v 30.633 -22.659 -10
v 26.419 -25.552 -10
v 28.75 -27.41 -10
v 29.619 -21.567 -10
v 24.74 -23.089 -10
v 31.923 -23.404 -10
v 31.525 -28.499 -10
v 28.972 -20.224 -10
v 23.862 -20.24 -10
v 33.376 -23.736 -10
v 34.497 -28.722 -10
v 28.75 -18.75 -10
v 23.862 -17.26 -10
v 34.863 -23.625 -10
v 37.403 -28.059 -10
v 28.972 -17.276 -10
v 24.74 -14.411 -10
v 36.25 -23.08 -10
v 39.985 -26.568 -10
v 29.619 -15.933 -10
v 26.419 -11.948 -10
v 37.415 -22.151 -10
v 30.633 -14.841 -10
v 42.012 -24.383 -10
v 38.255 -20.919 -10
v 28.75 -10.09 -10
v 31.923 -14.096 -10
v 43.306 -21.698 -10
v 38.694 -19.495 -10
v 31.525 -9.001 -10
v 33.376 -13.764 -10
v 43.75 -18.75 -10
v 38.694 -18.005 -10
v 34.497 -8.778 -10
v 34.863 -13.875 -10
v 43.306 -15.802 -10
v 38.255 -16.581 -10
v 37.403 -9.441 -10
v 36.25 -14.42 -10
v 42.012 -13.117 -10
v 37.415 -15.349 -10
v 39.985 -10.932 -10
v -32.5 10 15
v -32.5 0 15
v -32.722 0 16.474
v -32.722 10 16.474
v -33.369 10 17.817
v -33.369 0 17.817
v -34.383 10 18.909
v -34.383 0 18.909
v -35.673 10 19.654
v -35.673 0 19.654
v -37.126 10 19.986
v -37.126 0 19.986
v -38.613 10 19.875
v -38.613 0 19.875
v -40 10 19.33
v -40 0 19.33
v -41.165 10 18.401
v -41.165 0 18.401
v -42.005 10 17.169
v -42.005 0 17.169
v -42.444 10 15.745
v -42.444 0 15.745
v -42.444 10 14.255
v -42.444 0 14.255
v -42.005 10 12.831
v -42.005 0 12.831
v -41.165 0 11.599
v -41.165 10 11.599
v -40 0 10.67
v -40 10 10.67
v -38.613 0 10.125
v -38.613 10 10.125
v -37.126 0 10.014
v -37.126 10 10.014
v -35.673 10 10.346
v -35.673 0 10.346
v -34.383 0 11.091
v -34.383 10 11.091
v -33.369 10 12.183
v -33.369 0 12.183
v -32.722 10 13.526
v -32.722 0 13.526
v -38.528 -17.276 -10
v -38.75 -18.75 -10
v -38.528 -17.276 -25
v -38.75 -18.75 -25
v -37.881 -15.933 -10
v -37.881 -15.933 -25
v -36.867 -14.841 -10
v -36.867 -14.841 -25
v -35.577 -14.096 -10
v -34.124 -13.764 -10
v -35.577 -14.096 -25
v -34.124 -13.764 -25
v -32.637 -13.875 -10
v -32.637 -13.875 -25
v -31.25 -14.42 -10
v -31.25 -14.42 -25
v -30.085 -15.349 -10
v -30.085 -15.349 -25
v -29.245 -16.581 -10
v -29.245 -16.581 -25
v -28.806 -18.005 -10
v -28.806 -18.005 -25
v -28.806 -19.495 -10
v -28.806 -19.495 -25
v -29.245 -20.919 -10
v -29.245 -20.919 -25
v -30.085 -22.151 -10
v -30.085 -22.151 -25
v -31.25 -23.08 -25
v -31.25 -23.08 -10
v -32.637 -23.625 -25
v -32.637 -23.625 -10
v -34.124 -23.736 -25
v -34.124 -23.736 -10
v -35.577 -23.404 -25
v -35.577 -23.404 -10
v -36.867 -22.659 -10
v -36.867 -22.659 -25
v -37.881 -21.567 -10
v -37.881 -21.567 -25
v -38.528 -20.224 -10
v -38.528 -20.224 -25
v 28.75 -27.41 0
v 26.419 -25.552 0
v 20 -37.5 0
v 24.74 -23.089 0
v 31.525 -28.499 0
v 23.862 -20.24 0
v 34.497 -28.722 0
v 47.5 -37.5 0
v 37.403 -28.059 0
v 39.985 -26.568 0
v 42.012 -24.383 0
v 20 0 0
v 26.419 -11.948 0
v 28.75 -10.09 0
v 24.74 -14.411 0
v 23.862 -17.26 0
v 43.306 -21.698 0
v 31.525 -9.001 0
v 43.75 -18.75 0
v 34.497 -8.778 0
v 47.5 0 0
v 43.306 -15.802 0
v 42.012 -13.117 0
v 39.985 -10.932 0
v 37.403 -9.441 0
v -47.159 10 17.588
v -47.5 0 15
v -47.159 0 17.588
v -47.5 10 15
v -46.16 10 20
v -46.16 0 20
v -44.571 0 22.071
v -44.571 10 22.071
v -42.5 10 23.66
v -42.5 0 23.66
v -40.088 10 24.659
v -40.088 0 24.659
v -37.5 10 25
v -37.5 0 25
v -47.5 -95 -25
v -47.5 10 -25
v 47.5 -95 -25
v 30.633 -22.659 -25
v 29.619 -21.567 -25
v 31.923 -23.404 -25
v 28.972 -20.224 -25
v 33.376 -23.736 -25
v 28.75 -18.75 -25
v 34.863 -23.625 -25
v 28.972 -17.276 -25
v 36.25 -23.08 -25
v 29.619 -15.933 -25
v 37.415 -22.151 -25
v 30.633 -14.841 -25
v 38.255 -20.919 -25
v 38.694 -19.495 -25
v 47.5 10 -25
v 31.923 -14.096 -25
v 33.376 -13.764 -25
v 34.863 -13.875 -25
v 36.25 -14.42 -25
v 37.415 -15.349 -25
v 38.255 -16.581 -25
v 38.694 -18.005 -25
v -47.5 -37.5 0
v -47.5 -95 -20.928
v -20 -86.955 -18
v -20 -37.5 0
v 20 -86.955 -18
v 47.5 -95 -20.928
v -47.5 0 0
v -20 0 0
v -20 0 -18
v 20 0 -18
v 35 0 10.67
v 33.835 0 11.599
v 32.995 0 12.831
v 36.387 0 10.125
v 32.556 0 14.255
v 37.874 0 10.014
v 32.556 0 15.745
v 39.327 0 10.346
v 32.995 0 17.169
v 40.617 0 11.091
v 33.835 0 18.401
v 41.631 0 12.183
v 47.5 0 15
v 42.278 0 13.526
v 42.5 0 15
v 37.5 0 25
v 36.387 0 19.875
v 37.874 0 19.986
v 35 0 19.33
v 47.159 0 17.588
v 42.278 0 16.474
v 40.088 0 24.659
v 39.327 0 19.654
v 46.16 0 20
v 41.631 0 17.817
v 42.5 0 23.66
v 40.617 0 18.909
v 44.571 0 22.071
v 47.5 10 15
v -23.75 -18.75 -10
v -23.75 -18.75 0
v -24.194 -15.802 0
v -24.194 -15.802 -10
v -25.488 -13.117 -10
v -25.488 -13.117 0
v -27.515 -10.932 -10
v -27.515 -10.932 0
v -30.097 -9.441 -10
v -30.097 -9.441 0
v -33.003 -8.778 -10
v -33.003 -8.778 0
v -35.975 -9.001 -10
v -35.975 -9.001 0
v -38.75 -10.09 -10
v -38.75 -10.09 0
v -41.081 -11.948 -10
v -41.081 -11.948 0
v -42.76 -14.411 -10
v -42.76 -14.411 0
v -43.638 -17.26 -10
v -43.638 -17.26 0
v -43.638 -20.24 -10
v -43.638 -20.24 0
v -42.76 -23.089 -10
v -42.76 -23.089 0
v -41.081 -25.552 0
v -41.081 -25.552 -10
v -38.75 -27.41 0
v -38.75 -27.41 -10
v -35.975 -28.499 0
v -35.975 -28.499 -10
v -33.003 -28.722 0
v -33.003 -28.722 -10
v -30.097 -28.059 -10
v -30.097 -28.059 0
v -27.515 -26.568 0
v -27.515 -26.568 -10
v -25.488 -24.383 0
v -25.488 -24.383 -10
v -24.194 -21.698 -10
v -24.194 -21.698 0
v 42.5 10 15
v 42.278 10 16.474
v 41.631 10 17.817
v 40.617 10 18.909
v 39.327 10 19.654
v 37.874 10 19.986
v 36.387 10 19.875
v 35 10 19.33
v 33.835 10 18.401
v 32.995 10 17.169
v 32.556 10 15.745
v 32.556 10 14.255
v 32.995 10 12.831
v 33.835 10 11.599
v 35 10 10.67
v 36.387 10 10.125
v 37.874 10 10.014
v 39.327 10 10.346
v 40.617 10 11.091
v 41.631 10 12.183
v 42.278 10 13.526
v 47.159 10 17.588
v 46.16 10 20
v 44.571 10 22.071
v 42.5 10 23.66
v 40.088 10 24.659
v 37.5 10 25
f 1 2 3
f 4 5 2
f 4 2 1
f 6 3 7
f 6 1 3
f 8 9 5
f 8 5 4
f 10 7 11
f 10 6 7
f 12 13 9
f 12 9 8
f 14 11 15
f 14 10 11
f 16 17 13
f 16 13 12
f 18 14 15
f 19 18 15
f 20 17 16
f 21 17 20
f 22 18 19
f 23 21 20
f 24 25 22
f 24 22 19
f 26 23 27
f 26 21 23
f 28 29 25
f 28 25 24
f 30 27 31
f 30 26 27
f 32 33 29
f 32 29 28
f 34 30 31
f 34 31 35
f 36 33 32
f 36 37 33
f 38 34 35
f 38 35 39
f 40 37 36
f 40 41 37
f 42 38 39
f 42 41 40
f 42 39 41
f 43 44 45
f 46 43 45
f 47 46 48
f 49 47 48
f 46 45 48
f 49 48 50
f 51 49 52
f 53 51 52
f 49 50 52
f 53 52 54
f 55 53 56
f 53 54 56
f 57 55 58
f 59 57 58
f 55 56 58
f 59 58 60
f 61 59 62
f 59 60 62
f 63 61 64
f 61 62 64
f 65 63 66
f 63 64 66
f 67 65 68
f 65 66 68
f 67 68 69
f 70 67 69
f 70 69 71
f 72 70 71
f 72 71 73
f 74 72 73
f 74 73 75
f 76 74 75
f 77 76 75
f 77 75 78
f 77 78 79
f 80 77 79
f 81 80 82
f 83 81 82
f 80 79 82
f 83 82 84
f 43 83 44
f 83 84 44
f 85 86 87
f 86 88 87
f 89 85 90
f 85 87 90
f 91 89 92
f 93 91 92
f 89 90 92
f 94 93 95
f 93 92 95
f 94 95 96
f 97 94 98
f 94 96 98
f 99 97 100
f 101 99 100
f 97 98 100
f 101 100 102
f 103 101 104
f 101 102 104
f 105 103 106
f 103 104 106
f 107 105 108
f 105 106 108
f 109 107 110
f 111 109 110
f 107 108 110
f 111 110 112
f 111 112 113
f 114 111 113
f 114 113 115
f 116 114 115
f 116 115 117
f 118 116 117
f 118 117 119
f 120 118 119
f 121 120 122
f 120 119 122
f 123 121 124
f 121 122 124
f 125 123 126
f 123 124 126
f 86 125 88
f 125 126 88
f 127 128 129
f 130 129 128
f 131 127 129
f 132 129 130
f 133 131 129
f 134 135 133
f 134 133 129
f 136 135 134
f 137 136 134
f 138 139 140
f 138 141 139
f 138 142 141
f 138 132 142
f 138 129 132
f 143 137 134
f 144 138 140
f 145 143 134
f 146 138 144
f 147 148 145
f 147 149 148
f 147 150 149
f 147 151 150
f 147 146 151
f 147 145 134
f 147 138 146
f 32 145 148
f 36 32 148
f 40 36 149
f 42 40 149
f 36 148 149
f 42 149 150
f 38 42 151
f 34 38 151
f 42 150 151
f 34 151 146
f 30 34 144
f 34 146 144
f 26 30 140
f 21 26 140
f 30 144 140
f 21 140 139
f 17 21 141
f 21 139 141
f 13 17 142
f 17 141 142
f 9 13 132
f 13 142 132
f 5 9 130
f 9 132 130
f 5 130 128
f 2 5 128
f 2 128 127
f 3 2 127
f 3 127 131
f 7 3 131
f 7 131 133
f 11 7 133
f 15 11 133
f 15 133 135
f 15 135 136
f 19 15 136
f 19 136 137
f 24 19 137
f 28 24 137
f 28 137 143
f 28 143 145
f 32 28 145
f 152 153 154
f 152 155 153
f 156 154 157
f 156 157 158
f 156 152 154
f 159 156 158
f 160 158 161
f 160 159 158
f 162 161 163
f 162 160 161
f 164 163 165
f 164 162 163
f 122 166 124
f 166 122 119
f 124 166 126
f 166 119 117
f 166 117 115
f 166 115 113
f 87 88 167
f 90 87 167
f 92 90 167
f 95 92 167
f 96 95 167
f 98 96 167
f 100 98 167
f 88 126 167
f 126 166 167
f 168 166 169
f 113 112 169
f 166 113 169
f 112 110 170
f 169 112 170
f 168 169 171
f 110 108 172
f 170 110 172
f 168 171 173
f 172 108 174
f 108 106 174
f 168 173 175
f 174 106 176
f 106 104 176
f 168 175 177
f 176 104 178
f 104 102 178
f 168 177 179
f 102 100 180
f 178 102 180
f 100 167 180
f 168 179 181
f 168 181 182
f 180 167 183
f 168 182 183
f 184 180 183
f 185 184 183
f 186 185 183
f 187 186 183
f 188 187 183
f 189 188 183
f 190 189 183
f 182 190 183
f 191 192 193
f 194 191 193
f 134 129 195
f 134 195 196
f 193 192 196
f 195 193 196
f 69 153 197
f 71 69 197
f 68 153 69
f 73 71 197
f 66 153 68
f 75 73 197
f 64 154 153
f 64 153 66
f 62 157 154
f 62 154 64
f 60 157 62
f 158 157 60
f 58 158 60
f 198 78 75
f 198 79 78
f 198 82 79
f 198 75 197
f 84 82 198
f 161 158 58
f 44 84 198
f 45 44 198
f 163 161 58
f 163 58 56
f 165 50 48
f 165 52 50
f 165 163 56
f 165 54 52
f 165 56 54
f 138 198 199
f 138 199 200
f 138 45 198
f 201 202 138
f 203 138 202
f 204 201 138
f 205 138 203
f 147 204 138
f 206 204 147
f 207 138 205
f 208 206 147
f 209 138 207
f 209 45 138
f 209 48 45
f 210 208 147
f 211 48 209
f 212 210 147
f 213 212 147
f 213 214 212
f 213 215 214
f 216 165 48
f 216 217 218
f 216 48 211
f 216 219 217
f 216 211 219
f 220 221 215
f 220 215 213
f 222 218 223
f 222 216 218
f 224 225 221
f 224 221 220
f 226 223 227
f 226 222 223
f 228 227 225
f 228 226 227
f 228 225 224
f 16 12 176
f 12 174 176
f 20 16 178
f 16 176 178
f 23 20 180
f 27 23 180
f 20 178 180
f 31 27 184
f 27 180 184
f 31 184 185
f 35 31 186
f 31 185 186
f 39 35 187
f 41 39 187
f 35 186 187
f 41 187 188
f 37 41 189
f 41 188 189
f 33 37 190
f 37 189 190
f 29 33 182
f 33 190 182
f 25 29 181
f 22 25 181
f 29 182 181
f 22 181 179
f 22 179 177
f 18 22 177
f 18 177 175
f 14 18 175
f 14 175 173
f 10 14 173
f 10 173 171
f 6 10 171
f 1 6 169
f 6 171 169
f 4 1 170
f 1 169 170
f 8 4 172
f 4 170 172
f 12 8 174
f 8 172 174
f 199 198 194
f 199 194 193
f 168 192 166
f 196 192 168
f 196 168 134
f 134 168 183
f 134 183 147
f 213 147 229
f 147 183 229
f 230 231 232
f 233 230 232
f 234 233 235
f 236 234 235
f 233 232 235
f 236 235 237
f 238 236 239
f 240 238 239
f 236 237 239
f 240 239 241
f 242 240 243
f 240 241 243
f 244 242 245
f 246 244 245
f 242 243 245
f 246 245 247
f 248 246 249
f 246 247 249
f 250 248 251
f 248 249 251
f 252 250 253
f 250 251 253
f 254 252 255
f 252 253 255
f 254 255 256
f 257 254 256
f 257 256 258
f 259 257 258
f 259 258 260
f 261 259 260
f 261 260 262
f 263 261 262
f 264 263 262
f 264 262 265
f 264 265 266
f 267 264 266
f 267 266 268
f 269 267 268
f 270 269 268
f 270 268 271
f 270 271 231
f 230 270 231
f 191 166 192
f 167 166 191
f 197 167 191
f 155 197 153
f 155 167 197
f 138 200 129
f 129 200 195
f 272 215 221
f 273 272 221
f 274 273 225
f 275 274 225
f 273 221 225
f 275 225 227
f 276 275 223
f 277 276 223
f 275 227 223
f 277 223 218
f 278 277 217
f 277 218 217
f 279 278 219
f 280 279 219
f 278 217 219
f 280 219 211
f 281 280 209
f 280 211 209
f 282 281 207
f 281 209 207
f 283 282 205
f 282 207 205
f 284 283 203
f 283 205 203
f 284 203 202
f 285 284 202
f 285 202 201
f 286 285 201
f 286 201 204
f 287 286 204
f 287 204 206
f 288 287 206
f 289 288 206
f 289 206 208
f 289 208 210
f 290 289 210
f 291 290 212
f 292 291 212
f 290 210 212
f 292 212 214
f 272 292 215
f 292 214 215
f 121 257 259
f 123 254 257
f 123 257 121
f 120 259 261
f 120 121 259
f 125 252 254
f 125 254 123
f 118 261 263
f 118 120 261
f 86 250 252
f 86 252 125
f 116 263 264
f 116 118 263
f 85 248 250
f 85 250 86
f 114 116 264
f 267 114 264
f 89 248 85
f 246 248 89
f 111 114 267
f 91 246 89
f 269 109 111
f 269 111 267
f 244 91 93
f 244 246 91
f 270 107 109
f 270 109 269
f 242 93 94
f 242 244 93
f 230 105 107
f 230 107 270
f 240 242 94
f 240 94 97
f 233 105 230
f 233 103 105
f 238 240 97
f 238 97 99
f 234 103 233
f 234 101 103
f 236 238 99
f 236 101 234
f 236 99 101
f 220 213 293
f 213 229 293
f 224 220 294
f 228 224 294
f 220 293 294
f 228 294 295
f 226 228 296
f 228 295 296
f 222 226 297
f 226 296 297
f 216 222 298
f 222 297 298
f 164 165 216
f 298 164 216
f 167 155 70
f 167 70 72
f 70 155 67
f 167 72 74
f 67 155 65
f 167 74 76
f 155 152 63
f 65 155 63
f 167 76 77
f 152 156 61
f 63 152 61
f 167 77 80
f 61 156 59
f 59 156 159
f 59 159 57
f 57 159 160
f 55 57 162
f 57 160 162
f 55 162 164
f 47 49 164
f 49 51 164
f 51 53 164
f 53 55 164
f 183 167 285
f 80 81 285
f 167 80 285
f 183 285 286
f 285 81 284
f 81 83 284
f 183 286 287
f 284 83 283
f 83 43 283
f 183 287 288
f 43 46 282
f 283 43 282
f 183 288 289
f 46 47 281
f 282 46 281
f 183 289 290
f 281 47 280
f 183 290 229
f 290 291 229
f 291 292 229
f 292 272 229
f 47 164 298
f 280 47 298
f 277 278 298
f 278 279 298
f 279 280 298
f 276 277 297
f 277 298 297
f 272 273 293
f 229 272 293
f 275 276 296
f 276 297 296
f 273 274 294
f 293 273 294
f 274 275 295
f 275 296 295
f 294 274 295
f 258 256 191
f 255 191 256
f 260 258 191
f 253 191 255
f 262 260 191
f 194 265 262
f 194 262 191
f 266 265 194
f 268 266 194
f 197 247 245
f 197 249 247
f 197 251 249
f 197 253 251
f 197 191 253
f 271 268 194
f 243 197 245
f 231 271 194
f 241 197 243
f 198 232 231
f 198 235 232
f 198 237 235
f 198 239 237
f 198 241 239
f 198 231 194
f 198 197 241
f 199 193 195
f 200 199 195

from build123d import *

# Parameters (mm, degrees)
F0_W            = 95
F0_H            = 50
F1_DEPTH        = 10
F2_R            = 10
F3_R            = 5
F4_DEPTH        = 10
F3_W            = 95
F3_H            = 25
F5_DEPTH        = 95
F6_W            = 40
F6_H            = 18
F7_DEPTH        = 95
F8_C1_SIZE2     = 20.9282884703
F8_C1_SIZE      = 57.5
F10_D           = 10
F10_CBORE_D     = 20
F10_CBORE_DEPTH = 10


with BuildPart() as f1:
    # F0 (on Front) → F1 (new body)
    with BuildSketch(Plane.XZ):
        Rectangle(F0_W, F0_H)
    extrude(amount=-F1_DEPTH)

    # F2
    f2_edges = [f1.edges().sort_by_distance(p)[0] for p in [
        (-47.5, 5, 25),
        (47.5, 5, 25),
    ]]
    fillet(f2_edges, radius=F2_R)

    # F3 (on face) → F4 (cut, through all)
    with BuildSketch(Plane.XZ):
        with Locations((-37.5, 15)):
            Circle(F3_R)
        with Locations((37.5, 15)):
            Circle(F3_R)
    extrude(amount=-F4_DEPTH, mode=Mode.SUBTRACT)

    # F3 (on face) → F5 (join)
    with BuildSketch(Plane.XZ):
        with Locations((0, -12.5)):
            Rectangle(F3_W, F3_H)
    extrude(amount=F5_DEPTH)

    # F6 (on face) → F7 (cut, through all)
    with BuildSketch(Plane.XZ.offset(95)):
        with Locations((0, -9)):
            Rectangle(F6_W, F6_H)
        with Locations((0, 9)):
            Rectangle(F6_W, F6_H)
    extrude(amount=-F7_DEPTH, mode=Mode.SUBTRACT)

    # F8: chamfer of 57.5 x 20.9282884703 on 2 edges, made by hand

    # F8_c1
    f8_c1_edges = [f1.edges().sort_by_distance(p)[0] for p in [
        (33.75, -95, 0),
    ]]
    f8_c1_side = f1.faces().sort_by_distance((33.75, -94.5814342306, 0))[0]
    chamfer(f8_c1_edges, length=F8_C1_SIZE, length2=F8_C1_SIZE2, reference=f8_c1_side)

    # F10 (through all)
    with Locations(Plane.XY):
        with Locations((-33.75, -18.75), (33.75, -18.75)):
            CounterBoreHole(F10_D / 2, F10_CBORE_D / 2, F10_CBORE_DEPTH)


solid = f1.part
